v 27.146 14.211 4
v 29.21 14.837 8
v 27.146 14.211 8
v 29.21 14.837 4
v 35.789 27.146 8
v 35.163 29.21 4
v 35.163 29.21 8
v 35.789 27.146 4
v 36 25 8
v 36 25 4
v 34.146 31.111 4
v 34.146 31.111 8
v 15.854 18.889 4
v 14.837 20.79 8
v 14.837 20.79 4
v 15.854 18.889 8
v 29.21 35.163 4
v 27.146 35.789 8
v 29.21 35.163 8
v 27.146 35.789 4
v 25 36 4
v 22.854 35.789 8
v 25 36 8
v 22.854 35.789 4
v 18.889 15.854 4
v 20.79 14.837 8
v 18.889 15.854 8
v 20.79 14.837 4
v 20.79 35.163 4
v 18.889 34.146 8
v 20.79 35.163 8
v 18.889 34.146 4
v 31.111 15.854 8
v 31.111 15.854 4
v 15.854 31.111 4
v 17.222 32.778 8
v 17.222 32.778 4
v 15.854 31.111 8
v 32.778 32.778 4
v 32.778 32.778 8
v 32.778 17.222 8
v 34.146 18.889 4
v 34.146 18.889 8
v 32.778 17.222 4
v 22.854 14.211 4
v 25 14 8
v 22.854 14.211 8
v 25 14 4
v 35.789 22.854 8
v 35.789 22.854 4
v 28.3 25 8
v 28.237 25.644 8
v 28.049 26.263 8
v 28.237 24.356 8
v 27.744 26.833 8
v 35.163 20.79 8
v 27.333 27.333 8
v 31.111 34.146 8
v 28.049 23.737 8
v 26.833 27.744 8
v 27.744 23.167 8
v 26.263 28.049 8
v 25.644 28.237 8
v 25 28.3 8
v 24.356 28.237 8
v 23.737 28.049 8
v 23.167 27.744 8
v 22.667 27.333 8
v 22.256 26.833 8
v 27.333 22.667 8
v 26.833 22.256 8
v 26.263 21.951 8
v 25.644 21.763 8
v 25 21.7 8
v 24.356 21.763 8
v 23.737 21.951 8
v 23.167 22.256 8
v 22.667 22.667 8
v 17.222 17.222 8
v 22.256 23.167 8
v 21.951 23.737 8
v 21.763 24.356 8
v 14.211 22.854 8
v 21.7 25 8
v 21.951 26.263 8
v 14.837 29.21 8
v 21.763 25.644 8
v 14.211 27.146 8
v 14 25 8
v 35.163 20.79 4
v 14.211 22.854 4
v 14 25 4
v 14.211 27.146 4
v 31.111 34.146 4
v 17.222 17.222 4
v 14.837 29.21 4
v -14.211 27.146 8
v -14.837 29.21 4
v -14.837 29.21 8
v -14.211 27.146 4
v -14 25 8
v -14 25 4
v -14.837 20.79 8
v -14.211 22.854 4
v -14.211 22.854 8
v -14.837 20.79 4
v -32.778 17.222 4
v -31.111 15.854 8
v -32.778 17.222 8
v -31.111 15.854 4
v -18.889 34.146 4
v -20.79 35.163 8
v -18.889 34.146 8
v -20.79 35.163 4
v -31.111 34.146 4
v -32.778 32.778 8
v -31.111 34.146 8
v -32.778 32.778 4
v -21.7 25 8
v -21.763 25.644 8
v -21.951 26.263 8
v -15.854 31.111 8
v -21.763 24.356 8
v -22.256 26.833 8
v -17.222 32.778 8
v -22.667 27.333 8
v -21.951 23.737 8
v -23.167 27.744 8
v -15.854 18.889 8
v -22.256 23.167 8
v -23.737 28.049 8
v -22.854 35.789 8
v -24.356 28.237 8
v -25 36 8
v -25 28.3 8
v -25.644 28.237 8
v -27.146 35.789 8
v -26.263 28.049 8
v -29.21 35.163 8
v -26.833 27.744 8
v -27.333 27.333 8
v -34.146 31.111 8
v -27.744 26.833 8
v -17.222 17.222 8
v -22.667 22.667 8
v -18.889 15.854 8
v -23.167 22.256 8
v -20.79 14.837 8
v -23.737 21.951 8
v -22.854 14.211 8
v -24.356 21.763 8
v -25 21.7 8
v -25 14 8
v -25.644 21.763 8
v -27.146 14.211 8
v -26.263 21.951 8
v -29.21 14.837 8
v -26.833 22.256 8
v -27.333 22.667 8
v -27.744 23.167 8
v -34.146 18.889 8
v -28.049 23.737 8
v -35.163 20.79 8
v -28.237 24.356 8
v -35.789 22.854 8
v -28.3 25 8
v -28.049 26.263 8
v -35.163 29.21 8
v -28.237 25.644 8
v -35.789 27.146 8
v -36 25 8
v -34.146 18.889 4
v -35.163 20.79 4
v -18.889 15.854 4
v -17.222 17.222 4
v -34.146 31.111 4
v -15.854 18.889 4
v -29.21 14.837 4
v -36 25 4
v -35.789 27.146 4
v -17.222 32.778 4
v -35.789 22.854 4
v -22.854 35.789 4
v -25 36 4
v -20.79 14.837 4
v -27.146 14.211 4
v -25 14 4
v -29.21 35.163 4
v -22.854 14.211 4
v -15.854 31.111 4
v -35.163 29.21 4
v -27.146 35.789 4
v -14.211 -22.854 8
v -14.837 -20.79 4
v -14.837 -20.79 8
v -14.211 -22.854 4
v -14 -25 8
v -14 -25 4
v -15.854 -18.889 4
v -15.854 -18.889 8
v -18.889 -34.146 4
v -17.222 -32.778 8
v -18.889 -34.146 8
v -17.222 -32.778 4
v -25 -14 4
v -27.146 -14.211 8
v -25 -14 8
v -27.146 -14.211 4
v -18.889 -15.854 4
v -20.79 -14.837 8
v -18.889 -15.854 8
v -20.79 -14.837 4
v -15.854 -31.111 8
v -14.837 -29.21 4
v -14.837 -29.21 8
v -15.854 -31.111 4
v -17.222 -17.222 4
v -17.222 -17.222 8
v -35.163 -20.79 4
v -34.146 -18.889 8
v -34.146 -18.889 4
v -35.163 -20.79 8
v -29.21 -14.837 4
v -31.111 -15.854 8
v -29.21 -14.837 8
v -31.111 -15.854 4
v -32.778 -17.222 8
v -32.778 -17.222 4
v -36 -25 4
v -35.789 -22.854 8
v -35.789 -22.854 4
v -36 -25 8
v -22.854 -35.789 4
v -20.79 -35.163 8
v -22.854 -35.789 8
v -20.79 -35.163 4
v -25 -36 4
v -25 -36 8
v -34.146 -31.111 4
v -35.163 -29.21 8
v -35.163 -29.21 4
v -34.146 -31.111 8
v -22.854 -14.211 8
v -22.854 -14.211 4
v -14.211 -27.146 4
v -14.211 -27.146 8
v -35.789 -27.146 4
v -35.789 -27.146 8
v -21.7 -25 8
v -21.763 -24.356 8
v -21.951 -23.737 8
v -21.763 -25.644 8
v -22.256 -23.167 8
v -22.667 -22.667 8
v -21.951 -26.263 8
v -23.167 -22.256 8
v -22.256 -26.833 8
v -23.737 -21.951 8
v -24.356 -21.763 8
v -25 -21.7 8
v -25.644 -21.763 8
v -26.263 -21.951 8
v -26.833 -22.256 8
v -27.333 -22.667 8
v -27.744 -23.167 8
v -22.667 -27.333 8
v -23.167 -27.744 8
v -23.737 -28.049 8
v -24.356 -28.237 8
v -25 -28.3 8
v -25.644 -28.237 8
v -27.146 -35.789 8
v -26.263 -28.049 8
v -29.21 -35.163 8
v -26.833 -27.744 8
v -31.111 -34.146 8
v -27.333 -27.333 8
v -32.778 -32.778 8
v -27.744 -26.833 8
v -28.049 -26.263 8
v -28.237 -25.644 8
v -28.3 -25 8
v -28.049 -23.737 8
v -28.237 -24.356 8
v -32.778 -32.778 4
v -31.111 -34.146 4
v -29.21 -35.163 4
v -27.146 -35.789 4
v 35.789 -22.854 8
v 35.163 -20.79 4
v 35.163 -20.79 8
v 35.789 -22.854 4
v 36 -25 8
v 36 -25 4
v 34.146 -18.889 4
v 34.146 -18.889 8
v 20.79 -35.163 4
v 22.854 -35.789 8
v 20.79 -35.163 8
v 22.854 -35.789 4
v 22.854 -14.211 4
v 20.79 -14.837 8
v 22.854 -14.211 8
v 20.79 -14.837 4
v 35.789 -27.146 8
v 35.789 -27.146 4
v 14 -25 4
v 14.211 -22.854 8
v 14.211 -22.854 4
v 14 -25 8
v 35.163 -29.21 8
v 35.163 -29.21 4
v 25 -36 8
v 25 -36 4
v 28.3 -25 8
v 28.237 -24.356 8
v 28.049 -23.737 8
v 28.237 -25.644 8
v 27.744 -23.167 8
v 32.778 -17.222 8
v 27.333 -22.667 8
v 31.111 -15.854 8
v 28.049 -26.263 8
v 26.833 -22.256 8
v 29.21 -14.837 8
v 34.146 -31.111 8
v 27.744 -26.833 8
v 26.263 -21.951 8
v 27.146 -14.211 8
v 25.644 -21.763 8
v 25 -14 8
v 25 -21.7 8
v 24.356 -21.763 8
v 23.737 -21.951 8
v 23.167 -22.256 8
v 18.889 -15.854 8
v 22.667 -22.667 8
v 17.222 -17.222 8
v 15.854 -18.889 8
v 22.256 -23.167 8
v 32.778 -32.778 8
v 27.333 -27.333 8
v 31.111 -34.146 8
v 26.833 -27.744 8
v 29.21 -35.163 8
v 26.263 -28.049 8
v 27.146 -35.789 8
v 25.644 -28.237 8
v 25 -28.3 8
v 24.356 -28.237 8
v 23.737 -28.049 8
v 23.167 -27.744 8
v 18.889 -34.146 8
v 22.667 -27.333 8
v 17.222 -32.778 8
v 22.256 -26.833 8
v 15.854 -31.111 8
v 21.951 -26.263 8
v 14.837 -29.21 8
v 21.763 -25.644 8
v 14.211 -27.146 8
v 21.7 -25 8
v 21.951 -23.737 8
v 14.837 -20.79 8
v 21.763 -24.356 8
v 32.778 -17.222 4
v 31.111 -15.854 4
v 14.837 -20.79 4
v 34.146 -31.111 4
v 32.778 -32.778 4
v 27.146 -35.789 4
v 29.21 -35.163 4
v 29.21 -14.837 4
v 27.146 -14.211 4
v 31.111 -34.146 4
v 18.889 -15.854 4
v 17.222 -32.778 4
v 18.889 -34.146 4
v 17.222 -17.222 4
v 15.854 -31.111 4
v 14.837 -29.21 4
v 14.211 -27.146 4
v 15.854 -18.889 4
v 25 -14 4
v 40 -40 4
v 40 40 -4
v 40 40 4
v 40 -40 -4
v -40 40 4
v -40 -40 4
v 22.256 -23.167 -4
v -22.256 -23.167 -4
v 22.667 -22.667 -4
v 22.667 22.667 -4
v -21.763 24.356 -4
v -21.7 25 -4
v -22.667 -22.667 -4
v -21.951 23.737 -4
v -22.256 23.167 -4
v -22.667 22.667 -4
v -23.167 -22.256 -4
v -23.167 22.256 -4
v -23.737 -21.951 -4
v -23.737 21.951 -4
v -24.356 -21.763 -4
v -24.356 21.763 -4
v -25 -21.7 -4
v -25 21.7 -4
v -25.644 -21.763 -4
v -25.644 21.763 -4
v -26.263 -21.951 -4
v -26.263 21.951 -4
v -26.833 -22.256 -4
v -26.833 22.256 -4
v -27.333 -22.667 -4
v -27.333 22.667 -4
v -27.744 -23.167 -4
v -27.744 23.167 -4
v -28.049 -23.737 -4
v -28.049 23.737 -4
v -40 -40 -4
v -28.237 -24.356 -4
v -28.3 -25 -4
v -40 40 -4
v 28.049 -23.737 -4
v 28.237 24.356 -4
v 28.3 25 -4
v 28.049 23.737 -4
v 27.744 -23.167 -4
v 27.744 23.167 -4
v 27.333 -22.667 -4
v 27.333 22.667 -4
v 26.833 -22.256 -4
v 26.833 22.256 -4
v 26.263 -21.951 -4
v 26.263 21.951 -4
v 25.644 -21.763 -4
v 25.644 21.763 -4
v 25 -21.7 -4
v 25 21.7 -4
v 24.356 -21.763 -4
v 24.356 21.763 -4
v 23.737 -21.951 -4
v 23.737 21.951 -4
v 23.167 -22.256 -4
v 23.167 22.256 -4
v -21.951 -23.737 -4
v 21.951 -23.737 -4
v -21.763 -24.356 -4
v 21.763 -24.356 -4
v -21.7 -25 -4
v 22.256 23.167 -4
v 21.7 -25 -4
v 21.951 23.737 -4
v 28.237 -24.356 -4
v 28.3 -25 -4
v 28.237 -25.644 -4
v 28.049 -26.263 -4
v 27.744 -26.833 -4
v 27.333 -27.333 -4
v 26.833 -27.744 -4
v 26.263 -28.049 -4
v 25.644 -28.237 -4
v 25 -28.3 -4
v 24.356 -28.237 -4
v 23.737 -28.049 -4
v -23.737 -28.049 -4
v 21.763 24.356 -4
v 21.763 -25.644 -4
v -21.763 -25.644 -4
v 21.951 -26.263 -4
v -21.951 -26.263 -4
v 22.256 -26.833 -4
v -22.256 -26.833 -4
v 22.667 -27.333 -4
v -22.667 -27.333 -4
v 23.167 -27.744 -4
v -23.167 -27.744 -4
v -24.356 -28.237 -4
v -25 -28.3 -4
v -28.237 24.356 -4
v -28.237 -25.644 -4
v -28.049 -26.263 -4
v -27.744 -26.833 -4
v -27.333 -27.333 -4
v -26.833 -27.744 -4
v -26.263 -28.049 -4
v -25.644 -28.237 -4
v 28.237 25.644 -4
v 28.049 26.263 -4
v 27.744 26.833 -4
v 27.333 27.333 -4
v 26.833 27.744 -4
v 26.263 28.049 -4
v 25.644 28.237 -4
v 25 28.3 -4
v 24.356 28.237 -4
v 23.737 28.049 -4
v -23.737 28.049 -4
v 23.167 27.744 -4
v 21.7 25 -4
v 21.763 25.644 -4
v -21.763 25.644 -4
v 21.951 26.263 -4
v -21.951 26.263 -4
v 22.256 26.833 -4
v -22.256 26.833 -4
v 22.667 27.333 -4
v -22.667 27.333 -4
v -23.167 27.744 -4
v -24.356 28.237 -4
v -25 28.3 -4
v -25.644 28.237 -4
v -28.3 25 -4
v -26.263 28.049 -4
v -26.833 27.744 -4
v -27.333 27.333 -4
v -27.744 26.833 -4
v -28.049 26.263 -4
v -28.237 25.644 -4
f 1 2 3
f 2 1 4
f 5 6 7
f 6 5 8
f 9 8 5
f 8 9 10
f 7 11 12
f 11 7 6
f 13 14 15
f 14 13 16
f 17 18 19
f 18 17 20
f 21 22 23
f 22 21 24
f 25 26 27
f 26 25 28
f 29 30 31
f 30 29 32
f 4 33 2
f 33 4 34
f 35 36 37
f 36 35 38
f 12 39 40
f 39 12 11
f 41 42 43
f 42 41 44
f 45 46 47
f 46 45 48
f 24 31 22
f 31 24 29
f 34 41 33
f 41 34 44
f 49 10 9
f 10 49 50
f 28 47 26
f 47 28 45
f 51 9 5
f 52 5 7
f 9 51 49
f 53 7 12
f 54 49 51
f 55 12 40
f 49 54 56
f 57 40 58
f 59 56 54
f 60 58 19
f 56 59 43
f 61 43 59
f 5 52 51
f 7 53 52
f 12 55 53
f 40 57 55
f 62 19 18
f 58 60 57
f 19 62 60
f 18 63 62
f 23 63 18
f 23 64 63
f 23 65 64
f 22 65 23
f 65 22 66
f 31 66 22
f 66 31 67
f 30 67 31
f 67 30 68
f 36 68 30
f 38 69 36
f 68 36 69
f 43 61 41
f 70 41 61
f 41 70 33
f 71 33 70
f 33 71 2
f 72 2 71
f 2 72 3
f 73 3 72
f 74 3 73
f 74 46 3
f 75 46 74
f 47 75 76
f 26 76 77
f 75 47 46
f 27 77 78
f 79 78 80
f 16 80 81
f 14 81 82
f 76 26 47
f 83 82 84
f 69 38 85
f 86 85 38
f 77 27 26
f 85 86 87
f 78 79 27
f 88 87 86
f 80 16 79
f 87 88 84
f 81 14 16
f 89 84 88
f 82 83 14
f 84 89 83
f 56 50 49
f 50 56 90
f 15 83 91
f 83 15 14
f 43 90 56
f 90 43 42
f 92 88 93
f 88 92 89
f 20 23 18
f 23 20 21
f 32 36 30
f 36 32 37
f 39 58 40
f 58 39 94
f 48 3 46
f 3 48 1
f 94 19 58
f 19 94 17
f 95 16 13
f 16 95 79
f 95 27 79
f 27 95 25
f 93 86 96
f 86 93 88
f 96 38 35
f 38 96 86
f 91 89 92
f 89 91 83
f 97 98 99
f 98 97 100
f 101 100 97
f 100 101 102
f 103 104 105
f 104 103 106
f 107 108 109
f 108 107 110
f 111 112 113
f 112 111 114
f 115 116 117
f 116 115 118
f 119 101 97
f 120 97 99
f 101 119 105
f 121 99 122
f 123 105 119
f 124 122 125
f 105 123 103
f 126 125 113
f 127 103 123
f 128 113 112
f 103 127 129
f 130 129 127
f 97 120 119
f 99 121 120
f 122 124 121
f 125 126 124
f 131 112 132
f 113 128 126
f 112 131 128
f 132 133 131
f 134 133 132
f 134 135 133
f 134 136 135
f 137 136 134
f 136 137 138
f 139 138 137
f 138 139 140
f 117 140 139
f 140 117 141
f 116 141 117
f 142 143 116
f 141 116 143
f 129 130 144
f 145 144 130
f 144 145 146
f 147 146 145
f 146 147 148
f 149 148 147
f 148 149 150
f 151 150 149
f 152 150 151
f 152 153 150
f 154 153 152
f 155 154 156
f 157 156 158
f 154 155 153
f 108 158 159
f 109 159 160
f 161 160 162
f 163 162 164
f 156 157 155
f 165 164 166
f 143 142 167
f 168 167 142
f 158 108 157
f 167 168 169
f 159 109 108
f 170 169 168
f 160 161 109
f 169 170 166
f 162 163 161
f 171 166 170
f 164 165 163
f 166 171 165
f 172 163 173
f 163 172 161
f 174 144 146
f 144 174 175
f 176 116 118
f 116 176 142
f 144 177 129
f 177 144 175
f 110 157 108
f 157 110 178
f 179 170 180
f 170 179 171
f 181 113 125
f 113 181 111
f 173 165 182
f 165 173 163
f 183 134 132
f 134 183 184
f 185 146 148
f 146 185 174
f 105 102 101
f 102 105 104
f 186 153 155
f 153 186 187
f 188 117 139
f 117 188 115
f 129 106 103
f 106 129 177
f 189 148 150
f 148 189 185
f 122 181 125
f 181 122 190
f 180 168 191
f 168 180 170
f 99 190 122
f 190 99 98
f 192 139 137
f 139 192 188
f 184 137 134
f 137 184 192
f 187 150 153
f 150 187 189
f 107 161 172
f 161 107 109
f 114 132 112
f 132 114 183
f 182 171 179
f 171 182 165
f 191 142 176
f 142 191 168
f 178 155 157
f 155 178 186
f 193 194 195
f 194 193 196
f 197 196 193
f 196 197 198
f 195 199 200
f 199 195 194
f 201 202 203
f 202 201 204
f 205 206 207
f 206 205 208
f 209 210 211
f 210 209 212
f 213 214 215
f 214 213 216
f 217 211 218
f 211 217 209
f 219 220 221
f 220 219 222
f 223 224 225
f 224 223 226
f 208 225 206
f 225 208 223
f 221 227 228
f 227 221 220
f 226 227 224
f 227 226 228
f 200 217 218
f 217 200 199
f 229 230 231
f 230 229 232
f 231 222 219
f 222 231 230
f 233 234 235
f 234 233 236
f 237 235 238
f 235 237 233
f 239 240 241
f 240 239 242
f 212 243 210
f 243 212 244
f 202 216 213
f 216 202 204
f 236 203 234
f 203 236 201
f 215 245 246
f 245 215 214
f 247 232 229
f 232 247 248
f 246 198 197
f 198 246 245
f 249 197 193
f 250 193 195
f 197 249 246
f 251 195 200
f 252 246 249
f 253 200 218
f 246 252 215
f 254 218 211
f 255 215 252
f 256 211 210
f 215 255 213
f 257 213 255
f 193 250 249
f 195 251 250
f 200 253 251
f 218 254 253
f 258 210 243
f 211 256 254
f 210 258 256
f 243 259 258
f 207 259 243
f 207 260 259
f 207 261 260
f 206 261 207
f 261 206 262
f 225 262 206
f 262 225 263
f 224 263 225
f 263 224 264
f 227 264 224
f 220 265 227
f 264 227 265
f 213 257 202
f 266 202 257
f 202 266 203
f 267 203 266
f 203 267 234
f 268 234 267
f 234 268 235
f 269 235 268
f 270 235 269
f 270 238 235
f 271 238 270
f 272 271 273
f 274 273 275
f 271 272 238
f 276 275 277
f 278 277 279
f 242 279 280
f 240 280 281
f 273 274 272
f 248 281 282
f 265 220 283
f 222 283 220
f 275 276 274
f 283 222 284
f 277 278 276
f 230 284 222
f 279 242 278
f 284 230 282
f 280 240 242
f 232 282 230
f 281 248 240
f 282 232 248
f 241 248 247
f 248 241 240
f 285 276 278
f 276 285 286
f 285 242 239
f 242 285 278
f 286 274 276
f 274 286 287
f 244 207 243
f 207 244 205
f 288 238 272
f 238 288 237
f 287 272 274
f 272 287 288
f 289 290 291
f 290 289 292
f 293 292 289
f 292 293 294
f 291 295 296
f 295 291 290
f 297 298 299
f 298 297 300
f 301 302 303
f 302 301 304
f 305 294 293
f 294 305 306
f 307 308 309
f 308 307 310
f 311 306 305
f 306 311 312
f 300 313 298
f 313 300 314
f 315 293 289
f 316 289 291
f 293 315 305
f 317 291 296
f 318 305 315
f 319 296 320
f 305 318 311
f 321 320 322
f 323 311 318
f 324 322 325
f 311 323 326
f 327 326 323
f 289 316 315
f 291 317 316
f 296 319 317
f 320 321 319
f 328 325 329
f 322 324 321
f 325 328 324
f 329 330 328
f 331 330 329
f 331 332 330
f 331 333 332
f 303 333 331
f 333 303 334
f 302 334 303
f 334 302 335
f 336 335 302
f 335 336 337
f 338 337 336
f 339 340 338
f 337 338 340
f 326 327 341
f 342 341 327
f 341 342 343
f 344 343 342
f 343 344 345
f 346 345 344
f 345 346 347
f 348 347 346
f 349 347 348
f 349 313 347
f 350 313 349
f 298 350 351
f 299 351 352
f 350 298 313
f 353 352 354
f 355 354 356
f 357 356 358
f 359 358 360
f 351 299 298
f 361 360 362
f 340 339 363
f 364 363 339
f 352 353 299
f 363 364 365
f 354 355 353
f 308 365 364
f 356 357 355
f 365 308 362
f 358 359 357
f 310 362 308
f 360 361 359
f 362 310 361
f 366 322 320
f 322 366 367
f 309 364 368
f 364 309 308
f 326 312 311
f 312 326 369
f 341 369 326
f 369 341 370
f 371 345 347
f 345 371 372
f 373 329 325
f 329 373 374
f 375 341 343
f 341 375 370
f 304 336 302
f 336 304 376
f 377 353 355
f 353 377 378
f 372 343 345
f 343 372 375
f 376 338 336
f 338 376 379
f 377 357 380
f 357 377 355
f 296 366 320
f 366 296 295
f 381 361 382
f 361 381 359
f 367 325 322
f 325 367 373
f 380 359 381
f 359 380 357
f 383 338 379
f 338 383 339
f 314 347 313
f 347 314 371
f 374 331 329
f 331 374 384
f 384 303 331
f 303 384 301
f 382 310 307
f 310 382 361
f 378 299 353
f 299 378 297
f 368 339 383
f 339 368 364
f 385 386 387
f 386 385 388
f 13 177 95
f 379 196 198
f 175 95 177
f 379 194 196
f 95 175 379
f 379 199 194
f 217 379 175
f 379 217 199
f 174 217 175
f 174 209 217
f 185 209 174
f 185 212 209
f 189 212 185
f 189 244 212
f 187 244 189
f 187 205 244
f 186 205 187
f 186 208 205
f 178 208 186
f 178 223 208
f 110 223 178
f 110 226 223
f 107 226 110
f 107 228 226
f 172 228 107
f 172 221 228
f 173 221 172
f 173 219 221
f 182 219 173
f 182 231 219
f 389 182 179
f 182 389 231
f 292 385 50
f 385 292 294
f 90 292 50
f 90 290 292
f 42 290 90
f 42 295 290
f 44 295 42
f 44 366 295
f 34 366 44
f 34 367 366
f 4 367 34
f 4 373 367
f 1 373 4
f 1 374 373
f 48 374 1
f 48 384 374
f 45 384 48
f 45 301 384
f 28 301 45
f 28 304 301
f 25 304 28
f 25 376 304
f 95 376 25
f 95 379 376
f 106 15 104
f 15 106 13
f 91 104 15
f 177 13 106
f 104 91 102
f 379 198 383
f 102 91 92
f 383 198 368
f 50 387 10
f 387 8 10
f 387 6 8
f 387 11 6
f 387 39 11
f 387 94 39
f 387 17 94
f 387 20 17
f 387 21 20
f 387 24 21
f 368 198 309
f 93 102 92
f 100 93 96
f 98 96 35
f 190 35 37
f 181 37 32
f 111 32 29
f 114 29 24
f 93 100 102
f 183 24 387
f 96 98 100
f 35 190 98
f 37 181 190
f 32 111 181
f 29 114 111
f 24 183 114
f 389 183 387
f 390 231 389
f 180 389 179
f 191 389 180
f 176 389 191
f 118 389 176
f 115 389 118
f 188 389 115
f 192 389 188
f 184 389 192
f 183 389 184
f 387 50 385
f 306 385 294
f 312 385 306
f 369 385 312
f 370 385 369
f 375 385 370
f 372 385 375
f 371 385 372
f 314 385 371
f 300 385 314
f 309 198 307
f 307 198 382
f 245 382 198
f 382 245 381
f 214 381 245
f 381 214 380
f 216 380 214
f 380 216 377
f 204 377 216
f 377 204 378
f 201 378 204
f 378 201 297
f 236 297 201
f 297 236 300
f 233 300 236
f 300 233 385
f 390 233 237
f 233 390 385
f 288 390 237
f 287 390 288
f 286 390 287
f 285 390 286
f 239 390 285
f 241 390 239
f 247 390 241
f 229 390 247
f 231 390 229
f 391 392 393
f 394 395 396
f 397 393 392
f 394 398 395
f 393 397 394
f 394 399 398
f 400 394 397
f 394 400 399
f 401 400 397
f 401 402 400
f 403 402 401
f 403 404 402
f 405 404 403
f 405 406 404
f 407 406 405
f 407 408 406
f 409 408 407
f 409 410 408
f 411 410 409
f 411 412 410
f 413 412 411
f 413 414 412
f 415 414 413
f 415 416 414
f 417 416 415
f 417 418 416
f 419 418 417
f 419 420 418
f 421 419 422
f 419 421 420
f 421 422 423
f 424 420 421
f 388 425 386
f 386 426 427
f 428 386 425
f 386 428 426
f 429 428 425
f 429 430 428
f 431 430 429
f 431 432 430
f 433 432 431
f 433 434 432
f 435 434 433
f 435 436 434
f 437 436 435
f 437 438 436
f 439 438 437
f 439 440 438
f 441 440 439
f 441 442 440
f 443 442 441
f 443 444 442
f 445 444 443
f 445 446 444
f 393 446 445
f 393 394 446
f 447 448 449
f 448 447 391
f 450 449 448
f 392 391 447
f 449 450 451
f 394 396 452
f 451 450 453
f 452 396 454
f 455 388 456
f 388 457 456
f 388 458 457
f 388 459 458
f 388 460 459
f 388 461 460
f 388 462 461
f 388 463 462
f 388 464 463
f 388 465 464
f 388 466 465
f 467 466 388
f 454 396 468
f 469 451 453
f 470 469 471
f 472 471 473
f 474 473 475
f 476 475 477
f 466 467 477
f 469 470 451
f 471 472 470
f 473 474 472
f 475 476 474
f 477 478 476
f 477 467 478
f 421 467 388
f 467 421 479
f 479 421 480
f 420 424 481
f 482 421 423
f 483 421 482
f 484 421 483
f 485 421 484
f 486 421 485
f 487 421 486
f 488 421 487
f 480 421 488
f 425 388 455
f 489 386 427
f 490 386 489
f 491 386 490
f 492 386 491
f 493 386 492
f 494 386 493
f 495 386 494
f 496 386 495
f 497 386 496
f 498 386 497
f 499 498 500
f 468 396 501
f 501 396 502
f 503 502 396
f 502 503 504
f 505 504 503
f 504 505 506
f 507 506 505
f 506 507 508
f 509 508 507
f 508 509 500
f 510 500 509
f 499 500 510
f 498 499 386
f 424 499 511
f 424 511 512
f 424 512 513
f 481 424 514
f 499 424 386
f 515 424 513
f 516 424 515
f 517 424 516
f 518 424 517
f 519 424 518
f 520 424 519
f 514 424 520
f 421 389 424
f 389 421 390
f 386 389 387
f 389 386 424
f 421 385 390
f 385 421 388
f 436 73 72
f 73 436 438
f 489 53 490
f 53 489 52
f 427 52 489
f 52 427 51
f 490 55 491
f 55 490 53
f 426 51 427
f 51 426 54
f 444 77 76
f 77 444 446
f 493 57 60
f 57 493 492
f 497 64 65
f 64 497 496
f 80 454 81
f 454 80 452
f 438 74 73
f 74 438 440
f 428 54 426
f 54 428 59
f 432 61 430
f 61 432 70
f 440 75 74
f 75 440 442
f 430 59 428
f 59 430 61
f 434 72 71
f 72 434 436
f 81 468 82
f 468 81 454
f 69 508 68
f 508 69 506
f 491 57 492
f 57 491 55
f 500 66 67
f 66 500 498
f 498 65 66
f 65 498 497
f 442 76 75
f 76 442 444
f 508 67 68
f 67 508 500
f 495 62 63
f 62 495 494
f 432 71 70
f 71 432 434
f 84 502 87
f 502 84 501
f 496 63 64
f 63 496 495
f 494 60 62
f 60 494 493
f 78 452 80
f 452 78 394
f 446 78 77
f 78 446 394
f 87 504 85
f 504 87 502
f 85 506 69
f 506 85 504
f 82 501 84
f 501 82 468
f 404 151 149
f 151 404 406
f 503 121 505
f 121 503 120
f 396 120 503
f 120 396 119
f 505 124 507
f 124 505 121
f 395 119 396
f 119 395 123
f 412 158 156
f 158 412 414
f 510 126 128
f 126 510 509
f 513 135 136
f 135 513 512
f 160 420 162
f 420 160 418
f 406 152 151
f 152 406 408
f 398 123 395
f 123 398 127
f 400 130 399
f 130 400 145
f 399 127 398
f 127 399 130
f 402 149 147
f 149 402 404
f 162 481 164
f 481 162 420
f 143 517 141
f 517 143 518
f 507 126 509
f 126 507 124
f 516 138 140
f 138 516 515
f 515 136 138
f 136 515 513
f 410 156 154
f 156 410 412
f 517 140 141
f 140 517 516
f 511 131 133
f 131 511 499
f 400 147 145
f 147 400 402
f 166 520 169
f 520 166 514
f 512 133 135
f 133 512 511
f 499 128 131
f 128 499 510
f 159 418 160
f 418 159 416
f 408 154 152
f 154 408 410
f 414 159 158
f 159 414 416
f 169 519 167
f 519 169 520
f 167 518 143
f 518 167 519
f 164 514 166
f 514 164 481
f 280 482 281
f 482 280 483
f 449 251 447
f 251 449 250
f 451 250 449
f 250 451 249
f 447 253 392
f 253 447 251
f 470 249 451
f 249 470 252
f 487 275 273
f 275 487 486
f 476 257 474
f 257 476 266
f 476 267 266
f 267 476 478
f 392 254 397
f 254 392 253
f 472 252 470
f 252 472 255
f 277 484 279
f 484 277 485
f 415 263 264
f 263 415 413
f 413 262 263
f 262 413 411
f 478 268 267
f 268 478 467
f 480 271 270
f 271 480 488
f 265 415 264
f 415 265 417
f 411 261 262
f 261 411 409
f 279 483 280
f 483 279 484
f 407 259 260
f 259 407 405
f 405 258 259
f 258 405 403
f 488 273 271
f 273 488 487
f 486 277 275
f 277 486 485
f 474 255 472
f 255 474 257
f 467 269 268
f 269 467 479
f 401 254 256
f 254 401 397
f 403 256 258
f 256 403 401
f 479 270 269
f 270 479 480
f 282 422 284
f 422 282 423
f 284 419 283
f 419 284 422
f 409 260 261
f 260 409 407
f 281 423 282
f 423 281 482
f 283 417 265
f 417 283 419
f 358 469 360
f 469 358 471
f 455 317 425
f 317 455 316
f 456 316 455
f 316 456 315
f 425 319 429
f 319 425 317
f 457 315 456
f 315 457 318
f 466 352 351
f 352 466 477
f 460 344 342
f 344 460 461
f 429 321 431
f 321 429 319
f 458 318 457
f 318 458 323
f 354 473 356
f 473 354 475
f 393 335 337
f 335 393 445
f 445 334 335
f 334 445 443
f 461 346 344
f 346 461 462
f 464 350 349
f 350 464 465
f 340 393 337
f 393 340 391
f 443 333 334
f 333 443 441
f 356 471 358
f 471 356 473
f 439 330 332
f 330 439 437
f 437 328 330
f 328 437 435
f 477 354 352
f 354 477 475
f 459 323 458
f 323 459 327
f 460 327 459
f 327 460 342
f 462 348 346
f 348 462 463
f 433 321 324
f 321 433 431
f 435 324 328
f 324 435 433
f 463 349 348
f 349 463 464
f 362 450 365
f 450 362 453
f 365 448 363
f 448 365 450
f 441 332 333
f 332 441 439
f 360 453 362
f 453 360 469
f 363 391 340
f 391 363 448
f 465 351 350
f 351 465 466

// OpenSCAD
$fn = 32;

// ----------------------------------------------------------------------
// Anchor pads 80 x 80 x 12
// four corner bosses with anchor holes
// ----------------------------------------------------------------------

// --- parameters (mm) ---
plate = [80, 80, 8];  // base plate size (x, y, z)
pads = 4;             // boss count, one per corner
edge = 15;            // boss centre offset from the plate edge
boss_d = 22;          // boss diameter
boss_h = 4;           // boss height above the base plate
hole_d = 6.6;         // hole diameter

// --- derived feature positions (mm) ---
height = plate[2] + boss_h;      // = 12   overall height of the part
corner_x = plate[0] / 2 - edge;  // = 25   boss centre X
corner_y = plate[1] / 2 - edge;  // = 25   boss centre Y
feature_centers = [
  [corner_x, corner_y],
  [-corner_x, corner_y],
  [-corner_x, -corner_y],
  [corner_x, -corner_y]
];   // boss centres, anchor holes are drilled there

// base plate, four bosses standing on it, anchor holes all the way through
difference() {
  union() {
    cube(plate, center = true);
    for (centre = feature_centers)
      translate([centre[0], centre[1], plate[2] / 2 - 1])
        cylinder(d = boss_d, h = boss_h + 1);
  }
  for (centre = feature_centers)
    translate([centre[0], centre[1], -height])
      cylinder(d = hole_d, h = 2 * height + 2);  // through boss and plate
}
